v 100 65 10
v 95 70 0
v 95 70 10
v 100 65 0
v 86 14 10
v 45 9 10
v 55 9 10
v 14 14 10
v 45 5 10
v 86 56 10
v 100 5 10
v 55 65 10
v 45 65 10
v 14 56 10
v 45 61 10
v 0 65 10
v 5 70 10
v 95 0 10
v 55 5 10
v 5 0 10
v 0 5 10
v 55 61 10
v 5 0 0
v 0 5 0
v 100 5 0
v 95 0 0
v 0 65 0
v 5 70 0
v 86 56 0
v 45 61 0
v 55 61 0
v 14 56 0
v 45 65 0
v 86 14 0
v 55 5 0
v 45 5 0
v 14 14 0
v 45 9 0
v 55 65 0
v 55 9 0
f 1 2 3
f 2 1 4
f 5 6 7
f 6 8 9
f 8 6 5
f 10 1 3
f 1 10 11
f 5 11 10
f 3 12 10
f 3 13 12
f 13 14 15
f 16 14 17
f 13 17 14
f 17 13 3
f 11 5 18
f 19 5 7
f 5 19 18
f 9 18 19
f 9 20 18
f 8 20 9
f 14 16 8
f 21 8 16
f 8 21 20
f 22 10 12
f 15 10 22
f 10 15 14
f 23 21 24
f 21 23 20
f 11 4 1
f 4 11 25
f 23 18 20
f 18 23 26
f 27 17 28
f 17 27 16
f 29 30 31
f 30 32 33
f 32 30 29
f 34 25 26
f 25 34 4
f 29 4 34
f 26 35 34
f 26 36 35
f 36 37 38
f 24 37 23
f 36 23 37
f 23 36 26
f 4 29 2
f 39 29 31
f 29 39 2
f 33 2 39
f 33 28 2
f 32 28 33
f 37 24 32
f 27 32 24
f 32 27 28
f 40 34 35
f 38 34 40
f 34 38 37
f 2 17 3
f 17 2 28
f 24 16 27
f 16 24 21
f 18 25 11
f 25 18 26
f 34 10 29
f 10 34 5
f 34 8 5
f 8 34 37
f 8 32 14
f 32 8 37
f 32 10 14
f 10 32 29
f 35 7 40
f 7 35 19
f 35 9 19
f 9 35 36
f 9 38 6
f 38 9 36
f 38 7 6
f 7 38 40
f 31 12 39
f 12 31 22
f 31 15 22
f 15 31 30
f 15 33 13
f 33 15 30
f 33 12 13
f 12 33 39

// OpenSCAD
$fn = 32;

// ----------------------------------------------------------------------
// Frame plate: 100 x 70 frame, 14 mm rails
// ----------------------------------------------------------------------

// --- parameters (mm) ---
plate_l = 100;            // plate length, X
plate_w = 70;             // plate width, Y
plate_t = 10;             // plate thickness, Z (extrusion height)
corner_c = 5;             // corner chamfer
frame_bar = 14;           // frame rail width
slot_l = 10;              // adjustment slot length
slot_w = 4;               // adjustment slot width

win_l = plate_l - 2 * frame_bar;  // window length
win_w = plate_w - 2 * frame_bar;  // window width

profile = [[5, 0], [95, 0], [100, 5], [100, 65], [95, 70], [5, 70], [0, 65], [0, 5]];  // primary outline, 8 points, counter clockwise
void_1 = [[14, 14], [86, 14], [86, 56], [14, 56]];  // the window, 4 points
void_2 = [[45, 5], [55, 5], [55, 9], [45, 9]];  // adjustment slot, 4 points
void_3 = [[45, 61], [55, 61], [55, 65], [45, 65]];  // adjustment slot, 4 points

// --- the one profile operation ---
difference() {
  linear_extrude(height = plate_t) polygon(points = profile);
  translate([0, 0, -1])
    linear_extrude(height = plate_t + 2) polygon(points = void_1);
  translate([0, 0, -1])
    linear_extrude(height = plate_t + 2) polygon(points = void_2);
  translate([0, 0, -1])
    linear_extrude(height = plate_t + 2) polygon(points = void_3);
}
